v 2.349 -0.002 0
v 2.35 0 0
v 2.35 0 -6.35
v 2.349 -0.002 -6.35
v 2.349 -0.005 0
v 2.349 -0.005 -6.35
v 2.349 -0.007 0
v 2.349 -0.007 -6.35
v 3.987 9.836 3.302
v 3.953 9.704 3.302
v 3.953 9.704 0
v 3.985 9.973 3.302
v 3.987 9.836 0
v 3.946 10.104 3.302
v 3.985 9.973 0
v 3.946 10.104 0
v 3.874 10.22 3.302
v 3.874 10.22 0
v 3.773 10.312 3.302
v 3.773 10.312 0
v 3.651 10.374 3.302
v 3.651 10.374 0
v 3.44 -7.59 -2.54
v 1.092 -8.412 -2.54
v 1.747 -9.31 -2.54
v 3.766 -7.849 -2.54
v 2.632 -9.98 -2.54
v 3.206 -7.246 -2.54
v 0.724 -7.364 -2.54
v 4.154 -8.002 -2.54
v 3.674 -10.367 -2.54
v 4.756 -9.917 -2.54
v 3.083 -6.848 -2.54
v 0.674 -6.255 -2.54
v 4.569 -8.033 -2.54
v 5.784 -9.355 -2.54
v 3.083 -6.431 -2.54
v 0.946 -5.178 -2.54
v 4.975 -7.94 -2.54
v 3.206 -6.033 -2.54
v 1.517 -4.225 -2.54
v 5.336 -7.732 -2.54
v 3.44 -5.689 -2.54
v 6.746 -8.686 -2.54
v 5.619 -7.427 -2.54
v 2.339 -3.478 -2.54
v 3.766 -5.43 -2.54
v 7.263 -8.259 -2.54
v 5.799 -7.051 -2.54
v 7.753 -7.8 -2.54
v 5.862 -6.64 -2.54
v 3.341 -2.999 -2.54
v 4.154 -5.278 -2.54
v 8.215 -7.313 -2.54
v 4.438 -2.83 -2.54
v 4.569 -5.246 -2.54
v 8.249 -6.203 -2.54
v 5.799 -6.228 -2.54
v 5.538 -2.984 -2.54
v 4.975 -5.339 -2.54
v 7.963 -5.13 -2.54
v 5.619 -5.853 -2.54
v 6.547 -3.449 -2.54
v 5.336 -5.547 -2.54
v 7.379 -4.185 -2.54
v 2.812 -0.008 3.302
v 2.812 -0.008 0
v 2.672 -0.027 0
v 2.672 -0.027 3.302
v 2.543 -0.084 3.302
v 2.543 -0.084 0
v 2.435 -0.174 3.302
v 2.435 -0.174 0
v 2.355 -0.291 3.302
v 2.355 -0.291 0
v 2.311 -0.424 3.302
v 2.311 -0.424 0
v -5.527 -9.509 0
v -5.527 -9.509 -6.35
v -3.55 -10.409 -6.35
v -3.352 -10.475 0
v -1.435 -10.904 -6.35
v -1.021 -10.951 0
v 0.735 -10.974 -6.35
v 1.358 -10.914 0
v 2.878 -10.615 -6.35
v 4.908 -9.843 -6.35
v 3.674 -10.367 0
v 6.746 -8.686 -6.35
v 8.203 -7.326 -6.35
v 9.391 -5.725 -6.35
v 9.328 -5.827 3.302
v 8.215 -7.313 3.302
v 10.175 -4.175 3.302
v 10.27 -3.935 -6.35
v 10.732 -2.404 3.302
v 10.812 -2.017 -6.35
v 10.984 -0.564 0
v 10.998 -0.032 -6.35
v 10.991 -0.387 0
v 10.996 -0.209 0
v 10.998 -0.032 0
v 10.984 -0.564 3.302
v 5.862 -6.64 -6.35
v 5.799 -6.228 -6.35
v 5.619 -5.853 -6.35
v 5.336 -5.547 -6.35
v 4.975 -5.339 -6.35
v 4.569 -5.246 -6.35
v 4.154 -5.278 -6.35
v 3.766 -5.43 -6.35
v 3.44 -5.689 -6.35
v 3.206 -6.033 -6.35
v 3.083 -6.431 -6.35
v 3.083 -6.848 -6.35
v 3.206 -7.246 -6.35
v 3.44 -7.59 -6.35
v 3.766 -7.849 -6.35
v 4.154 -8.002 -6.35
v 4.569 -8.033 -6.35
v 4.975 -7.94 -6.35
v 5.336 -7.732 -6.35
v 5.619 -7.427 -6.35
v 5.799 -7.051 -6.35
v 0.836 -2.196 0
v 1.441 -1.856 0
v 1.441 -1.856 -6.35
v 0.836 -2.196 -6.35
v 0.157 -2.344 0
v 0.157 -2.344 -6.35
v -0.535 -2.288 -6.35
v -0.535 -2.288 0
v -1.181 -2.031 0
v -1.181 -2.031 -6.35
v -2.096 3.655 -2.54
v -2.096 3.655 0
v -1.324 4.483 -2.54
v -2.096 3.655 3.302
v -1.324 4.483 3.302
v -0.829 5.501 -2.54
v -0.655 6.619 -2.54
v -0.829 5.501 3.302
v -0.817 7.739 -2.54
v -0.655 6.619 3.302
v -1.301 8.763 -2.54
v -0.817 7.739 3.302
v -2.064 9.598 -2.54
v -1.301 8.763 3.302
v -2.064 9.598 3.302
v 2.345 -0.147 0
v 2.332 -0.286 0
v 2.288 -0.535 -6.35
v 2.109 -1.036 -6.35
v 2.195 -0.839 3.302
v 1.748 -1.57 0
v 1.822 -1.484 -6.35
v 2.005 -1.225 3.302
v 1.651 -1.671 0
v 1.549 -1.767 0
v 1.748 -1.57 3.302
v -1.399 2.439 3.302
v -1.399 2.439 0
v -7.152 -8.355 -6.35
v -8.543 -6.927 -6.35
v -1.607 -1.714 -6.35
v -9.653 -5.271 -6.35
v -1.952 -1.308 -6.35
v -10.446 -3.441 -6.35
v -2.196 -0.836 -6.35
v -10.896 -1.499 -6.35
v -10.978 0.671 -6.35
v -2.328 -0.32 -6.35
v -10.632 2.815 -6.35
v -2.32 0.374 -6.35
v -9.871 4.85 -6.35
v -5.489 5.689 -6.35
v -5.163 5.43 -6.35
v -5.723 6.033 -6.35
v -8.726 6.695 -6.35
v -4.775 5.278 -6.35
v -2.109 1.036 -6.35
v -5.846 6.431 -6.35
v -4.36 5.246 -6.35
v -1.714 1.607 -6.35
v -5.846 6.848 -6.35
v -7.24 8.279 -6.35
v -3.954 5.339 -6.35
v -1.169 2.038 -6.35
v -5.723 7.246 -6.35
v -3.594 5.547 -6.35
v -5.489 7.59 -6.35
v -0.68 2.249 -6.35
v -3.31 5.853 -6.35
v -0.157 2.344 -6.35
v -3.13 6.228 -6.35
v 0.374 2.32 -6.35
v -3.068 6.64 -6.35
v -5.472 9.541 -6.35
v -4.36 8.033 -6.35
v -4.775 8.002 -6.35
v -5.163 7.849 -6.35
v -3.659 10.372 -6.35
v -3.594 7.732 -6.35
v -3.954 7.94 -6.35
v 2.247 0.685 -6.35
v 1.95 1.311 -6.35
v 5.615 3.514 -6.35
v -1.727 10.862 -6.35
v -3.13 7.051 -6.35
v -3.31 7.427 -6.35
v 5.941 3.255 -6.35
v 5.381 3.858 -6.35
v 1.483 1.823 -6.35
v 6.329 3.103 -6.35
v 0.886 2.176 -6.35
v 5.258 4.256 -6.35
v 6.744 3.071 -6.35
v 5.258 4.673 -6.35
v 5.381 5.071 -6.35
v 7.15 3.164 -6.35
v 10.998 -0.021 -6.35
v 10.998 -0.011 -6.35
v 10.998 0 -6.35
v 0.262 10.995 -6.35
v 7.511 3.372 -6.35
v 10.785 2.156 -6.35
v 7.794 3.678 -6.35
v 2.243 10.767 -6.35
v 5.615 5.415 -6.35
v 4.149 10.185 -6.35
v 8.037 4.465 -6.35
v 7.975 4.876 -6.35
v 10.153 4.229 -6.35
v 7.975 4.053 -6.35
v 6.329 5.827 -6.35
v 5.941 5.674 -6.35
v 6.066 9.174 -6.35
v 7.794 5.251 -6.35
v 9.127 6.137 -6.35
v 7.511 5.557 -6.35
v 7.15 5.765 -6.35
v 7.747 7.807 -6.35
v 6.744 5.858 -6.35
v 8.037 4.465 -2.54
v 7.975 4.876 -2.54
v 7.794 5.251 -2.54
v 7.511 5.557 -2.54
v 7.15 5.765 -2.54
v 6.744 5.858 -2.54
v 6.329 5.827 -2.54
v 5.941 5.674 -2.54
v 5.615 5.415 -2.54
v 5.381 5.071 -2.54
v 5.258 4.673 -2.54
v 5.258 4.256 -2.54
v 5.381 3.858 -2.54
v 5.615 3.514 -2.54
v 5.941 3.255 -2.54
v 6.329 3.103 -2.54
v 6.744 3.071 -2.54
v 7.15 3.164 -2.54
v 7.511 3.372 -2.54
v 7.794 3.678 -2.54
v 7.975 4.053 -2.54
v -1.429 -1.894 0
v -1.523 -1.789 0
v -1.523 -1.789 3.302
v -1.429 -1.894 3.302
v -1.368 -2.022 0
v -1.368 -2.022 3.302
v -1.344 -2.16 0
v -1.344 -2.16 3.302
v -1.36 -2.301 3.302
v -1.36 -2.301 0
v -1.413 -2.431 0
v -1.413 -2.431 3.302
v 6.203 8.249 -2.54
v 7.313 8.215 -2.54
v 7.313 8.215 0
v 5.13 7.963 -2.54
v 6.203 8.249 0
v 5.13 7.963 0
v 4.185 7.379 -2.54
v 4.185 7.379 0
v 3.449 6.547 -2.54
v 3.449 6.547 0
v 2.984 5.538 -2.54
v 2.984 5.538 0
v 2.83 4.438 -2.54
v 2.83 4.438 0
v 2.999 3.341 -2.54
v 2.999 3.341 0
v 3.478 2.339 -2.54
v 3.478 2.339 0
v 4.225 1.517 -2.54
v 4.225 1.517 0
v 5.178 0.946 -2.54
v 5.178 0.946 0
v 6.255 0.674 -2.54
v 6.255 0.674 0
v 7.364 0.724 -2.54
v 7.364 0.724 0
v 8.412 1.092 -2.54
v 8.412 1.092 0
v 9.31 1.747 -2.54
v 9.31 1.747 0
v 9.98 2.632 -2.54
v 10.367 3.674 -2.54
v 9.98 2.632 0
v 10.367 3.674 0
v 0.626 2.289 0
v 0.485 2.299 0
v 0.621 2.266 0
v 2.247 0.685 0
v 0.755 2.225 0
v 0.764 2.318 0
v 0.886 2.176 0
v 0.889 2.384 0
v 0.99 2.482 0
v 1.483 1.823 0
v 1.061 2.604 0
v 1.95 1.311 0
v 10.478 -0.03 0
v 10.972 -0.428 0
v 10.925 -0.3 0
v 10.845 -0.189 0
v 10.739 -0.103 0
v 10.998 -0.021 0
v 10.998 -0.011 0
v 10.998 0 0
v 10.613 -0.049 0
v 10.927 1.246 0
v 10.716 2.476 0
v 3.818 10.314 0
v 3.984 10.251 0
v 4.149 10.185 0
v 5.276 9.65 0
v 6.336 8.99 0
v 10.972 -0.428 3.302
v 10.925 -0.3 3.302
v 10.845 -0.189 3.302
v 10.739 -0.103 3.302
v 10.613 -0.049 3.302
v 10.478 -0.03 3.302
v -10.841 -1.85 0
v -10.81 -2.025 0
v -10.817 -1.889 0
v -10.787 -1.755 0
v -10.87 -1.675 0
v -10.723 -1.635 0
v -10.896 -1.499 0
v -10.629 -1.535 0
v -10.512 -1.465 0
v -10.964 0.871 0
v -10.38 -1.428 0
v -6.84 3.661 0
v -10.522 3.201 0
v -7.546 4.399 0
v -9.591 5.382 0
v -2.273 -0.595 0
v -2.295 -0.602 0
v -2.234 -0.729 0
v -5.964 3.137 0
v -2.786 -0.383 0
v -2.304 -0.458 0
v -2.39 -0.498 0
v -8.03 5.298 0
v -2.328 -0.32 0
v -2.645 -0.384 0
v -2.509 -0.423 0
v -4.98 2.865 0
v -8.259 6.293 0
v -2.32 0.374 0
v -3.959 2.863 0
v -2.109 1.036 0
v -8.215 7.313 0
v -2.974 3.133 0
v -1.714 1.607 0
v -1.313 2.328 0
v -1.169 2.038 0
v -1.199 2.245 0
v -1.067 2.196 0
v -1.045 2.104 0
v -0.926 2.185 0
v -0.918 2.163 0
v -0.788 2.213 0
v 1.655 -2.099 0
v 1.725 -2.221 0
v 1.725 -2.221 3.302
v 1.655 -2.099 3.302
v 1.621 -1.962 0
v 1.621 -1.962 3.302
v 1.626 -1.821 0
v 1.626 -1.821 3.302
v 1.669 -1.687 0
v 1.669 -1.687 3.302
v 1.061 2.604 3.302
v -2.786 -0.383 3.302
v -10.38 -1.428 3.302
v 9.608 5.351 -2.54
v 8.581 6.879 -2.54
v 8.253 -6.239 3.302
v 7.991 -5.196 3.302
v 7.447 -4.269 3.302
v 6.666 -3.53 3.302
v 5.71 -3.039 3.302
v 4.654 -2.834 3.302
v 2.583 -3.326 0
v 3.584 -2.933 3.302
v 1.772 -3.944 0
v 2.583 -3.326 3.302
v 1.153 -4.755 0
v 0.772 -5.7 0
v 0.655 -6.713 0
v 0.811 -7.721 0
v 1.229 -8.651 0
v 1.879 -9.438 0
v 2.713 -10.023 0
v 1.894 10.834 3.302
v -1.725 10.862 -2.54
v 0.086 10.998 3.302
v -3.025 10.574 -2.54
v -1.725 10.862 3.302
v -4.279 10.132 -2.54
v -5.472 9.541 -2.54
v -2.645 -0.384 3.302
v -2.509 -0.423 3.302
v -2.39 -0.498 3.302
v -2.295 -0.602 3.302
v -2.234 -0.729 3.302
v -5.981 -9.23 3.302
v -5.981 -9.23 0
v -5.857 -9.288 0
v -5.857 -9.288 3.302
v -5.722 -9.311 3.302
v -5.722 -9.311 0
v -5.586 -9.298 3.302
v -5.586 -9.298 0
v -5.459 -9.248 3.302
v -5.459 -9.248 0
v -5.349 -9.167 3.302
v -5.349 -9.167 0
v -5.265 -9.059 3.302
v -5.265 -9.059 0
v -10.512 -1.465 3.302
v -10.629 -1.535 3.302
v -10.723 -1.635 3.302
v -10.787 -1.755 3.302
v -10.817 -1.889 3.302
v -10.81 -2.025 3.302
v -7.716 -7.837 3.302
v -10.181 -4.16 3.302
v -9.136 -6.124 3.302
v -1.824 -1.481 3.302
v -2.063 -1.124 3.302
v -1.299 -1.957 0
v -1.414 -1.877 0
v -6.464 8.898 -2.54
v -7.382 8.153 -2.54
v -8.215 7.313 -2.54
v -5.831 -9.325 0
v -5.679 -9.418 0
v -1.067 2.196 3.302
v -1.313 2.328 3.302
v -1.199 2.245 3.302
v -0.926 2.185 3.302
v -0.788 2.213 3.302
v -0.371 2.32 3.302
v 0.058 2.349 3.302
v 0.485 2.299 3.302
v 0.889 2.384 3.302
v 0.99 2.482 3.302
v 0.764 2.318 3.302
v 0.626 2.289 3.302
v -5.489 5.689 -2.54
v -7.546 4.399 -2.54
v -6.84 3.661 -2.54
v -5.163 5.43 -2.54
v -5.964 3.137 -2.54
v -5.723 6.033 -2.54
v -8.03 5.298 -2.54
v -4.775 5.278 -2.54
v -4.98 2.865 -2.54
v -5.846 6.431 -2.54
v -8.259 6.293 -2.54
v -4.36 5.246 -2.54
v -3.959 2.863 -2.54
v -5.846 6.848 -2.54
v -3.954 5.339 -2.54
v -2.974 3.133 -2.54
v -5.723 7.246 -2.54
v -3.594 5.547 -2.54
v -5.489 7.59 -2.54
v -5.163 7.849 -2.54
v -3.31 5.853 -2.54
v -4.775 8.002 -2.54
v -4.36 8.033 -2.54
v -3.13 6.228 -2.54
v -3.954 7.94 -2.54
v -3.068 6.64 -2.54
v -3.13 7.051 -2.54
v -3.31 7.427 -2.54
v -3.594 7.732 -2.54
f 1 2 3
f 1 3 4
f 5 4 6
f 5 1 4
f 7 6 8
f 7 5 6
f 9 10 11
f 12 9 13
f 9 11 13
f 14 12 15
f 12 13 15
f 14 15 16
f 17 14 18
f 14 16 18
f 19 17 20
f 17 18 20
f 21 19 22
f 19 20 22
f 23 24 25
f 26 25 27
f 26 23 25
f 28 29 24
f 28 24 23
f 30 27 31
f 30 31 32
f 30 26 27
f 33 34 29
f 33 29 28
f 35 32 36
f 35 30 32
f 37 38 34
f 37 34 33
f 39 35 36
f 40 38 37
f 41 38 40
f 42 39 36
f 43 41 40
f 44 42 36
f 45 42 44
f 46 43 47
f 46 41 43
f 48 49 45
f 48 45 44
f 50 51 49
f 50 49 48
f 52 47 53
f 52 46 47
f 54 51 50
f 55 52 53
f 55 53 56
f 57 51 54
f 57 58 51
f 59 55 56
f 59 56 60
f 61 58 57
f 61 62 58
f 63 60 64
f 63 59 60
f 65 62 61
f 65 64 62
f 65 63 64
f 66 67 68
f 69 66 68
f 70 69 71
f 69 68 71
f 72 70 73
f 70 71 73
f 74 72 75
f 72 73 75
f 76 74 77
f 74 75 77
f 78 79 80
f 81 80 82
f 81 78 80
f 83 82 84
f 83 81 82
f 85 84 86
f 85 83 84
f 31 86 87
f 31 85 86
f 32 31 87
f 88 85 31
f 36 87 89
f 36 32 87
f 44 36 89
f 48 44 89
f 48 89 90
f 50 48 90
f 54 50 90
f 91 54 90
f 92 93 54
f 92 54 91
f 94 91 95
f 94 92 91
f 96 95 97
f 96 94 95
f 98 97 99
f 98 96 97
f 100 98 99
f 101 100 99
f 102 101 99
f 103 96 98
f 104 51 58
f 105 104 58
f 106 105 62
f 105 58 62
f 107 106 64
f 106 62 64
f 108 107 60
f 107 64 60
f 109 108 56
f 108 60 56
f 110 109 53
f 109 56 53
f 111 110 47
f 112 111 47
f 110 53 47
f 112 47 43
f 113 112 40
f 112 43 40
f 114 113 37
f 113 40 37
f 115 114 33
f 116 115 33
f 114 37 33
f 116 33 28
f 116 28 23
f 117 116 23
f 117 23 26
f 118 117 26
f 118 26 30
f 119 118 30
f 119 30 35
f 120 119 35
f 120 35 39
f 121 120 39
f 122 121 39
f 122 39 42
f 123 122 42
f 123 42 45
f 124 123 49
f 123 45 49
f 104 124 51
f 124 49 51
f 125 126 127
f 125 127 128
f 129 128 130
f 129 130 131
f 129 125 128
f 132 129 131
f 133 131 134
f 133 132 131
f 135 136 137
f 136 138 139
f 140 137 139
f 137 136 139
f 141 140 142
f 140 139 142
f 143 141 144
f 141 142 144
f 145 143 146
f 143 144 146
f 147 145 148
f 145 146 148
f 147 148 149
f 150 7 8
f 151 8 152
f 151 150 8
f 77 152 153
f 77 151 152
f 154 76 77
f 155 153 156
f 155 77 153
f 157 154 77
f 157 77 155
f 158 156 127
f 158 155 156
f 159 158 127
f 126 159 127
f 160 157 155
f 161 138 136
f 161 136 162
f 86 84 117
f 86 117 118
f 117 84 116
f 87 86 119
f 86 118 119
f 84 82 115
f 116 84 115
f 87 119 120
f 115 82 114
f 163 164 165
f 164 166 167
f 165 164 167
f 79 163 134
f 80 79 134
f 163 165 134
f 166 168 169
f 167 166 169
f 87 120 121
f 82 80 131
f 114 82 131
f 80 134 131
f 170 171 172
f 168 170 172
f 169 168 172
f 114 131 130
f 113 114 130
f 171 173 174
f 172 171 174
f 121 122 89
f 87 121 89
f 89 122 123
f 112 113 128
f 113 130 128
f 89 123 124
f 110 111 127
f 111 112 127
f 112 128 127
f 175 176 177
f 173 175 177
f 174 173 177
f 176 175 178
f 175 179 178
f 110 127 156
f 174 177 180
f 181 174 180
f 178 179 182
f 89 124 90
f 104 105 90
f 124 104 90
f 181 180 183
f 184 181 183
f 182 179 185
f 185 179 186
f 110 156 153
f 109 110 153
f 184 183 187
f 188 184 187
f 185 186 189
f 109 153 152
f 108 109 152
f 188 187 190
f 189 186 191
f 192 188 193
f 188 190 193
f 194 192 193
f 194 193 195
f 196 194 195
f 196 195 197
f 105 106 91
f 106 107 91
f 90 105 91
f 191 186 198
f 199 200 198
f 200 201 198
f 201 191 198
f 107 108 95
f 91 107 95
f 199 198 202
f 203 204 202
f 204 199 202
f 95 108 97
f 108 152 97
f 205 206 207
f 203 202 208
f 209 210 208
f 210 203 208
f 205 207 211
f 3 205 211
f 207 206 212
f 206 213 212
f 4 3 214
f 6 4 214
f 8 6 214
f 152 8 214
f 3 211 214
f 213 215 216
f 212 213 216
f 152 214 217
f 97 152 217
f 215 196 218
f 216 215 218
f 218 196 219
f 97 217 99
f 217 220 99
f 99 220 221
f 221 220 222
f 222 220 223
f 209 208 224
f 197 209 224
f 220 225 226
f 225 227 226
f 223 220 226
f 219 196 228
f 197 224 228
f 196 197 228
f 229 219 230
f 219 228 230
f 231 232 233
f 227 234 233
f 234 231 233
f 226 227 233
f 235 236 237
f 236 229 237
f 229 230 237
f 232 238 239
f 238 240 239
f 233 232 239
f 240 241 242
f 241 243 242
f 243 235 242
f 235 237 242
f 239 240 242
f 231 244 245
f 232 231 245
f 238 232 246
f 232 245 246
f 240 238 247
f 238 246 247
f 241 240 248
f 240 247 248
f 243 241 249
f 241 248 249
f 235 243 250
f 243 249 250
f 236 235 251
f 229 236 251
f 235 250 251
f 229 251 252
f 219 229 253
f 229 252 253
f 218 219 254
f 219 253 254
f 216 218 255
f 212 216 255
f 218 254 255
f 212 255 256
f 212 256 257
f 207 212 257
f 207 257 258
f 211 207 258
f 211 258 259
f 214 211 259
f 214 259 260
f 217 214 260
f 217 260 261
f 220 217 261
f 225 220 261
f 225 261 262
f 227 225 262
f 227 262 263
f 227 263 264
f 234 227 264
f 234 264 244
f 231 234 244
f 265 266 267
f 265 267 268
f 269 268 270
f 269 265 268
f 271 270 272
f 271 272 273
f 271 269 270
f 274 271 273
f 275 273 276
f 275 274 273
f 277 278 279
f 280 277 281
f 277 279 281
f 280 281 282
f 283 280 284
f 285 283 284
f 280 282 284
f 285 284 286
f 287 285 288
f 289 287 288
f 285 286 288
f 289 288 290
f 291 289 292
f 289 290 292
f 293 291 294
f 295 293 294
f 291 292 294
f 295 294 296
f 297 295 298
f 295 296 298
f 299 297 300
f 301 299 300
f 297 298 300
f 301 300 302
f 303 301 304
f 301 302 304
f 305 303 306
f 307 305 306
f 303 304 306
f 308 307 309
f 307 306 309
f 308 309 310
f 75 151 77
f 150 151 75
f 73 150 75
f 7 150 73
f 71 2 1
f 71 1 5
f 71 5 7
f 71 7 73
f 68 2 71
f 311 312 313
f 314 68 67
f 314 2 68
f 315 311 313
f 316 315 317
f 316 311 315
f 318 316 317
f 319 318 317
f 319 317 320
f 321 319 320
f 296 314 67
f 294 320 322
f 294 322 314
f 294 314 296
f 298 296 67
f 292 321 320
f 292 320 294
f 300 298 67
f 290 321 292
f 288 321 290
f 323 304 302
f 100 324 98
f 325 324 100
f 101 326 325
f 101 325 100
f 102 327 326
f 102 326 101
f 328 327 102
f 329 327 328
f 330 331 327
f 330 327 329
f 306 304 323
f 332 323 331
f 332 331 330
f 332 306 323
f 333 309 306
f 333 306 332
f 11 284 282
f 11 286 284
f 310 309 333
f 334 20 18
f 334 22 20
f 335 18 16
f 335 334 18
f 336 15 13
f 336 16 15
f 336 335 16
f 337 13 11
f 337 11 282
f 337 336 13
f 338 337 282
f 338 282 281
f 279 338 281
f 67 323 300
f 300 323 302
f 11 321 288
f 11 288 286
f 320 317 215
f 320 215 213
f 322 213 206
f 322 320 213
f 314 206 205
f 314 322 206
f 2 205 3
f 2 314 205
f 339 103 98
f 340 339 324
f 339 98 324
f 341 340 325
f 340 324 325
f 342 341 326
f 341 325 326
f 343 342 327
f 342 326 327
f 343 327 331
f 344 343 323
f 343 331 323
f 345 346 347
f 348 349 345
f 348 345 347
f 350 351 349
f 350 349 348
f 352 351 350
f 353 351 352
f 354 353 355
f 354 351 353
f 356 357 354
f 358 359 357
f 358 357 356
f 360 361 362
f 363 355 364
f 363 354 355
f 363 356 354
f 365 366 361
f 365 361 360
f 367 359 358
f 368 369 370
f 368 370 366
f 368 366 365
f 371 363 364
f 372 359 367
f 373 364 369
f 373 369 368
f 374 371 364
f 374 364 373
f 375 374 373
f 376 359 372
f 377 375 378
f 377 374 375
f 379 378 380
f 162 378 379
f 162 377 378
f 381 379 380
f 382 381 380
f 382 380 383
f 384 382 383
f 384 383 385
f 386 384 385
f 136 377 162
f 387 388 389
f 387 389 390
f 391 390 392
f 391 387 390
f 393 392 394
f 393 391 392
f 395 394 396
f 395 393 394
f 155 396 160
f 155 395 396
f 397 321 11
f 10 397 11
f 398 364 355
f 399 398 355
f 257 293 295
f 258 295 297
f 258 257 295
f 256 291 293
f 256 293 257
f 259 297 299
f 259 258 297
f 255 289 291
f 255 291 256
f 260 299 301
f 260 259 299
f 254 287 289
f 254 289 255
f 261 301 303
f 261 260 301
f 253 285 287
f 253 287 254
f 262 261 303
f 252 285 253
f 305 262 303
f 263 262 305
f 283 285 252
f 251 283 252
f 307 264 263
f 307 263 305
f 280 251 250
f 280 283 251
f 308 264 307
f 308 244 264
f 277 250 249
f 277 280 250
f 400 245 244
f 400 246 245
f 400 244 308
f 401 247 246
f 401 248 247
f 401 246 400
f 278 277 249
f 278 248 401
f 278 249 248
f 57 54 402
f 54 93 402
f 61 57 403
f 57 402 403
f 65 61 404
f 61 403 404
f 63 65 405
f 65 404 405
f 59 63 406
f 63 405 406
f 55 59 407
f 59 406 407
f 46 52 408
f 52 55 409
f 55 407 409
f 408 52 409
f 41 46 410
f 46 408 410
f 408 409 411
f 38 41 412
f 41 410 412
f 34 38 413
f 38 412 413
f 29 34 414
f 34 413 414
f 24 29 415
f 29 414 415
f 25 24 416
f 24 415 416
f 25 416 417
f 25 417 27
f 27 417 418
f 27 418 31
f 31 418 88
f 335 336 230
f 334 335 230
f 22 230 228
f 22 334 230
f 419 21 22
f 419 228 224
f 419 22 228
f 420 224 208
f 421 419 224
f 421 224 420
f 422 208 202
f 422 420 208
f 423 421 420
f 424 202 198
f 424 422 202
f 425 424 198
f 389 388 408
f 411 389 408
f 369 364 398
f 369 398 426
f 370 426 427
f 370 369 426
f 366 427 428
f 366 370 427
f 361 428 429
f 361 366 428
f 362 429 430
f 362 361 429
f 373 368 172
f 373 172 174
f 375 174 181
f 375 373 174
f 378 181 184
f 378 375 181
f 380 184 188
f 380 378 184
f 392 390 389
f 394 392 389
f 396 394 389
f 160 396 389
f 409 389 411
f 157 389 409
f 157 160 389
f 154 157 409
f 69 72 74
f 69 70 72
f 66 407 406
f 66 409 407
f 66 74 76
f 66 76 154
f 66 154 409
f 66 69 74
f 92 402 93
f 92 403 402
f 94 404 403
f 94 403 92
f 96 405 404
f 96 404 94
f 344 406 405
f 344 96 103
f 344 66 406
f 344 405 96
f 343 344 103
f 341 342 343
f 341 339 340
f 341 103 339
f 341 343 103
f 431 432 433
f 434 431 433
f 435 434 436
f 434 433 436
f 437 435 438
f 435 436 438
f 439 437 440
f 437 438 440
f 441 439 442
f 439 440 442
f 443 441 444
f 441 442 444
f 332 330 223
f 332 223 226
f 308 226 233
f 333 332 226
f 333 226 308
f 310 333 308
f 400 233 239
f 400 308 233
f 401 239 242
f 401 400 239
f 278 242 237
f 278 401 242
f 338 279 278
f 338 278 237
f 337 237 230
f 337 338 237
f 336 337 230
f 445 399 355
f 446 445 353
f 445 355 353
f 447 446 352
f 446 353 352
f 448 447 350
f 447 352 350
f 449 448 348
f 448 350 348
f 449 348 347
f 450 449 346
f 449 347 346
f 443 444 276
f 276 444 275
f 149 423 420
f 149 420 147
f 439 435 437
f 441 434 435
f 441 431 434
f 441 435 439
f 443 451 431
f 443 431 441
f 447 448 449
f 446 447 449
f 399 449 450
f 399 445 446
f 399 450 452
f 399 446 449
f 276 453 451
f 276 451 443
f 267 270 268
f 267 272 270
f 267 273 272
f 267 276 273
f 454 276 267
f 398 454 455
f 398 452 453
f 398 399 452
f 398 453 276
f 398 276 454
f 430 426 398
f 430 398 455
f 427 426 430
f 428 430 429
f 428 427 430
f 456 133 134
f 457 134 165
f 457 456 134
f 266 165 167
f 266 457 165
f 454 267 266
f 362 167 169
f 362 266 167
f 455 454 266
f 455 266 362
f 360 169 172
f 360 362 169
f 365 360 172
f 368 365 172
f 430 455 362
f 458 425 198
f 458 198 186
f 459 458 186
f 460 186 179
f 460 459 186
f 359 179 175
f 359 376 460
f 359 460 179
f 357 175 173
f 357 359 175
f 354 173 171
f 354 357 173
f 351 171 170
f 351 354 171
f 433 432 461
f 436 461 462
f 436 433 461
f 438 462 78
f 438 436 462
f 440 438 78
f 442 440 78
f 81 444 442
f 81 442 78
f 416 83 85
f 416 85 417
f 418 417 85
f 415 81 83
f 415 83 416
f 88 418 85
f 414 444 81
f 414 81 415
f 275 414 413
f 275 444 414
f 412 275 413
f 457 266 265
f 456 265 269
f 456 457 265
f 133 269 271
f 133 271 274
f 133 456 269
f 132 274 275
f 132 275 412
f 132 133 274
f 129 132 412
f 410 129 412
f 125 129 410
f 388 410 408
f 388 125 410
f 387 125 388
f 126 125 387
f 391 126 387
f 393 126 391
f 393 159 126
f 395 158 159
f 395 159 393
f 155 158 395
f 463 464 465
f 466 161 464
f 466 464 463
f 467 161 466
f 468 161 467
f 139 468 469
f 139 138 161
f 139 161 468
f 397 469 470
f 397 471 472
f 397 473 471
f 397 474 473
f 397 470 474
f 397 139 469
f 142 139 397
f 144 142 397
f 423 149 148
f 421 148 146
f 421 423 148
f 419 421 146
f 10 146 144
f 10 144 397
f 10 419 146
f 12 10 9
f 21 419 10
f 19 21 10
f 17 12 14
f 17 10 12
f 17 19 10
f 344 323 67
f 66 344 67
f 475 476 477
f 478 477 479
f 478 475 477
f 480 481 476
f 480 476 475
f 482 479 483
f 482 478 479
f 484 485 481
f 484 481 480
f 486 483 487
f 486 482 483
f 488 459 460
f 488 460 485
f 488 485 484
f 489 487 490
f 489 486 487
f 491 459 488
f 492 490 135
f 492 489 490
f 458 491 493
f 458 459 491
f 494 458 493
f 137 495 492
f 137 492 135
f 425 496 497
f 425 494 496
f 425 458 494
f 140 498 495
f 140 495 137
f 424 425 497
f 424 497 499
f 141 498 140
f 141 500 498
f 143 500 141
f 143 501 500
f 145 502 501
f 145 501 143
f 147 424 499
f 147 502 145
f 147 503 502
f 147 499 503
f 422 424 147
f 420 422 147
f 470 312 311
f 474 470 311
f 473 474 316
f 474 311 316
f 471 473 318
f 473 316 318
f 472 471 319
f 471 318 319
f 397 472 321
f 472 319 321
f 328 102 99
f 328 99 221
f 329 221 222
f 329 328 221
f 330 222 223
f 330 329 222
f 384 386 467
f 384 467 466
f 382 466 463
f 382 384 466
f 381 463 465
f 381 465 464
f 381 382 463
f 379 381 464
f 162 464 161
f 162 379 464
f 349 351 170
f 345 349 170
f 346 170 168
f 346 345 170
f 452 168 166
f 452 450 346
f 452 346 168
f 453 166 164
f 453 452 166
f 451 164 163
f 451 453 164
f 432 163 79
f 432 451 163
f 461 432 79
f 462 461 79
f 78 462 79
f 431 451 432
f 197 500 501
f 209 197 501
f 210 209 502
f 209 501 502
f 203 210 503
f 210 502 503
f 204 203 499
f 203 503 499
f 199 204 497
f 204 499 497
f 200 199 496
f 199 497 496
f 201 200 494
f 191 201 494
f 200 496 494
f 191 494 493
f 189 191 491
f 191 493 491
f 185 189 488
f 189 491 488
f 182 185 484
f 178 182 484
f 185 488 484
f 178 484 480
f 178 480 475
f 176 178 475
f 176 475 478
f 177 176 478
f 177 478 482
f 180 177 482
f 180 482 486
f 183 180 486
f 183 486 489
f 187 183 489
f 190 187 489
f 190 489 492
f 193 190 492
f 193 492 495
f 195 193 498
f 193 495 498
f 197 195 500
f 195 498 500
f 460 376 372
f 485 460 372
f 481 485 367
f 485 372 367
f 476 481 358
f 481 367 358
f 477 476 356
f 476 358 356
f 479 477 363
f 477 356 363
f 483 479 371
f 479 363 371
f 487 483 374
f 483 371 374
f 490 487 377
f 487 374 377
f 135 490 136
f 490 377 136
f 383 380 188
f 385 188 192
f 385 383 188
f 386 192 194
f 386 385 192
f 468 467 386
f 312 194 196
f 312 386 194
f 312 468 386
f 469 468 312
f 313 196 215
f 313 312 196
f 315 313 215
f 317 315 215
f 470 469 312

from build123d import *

# Parameters (mm, degrees)
F1_DEPTH      = 3.302
F2_DEPTH      = 6.35
F3_T1_DEPTH   = 4.6338919233
F4_T1_DEPTH   = 4.4582047696
F5_R          = 1.397
F6_DEPTH      = 6.351
F6_DEPTH_BACK = 25.4
F7_R          = 3.81
F8_DEPTH      = 5.842
F9_T1_DEPTH   = 8.456355204
F9_T3_DEPTH   = 2.54


# Not quite as in the source:
# - a fillet or chamfer that OpenCascade refuses, or shapes differently, is made with other operations: its cross-section is extruded or revolved along the edge and cut away or added


with BuildPart() as f1:
    # F0 (on Top) → F1 (new body)
    with BuildSketch(Plane.XY):
        with BuildLine():
            Line((0.8864303251, 2.1758656964), (4.1494522244, 10.1854037464))
            ThreePointArc((4.1494522244, 10.1854037464), (-0.7354841661, 10.9735803766), (-5.4715498037, 9.5405736717))
            Line((-5.4715498037, 9.5405736717), (-1.1688645655, 2.0381133132))
            ThreePointArc((-1.1688645655, 2.0381133132), (-0.157118442, 2.3442406116), (0.8864303251, 2.1758656964))
        make_face()
    extrude(amount=F1_DEPTH)



with BuildPart() as f1b:
    # F0 (on Top) → F1, piece 2 (new body)
    with BuildSketch(Plane.XY):
        with BuildLine():
            Line((-2.3275701308, -0.320261668), (-10.8955445044, -1.4991708351))
            ThreePointArc((-10.8955445044, -1.4991708351), (-9.1356572935, -6.1237381602), (-5.5266042645, -9.5087879639))
            Line((-5.5266042645, -9.5087879639), (-1.1806256223, -2.0313230639))
            ThreePointArc((-1.1806256223, -2.0313230639), (-1.9516127013, -1.3081888679), (-2.3275701308, -0.320261668))
        make_face()
    extrude(amount=F1_DEPTH)


with BuildPart() as f1c:
    # F0 (on Top) → F1, piece 3 (new body)
    with BuildSketch(Plane.XY):
        with BuildLine():
            ThreePointArc((6.74609228, -8.6862329113), (9.8711414597, -4.8498422164), (10.9981540682, -0.0317857078))
            Line((10.9981540682, -0.0317857078), (2.3494901878, -0.0067902494))
            ThreePointArc((2.3494901878, -0.0067902494), (2.1087311432, -1.0360517437), (1.4411398058, -1.8556040284))
            Line((1.4411398058, -1.8556040284), (6.74609228, -8.6862329113))
        make_face()
    extrude(amount=F1_DEPTH)


with BuildPart() as f1_1:
    add(f1.part)

    add(f1b.part)  # F2 merges F1b

    add(f1c.part)  # F2 merges F1c
    # F0 (on Top) → F2 (join)
    with BuildSketch(Plane.XY):
        with BuildLine():
            ThreePointArc((10.9981540682, -0.0317857078), (10.9981885171, -0.0158928705), (10.9982, 0))
            ThreePointArc((10.9982, 0), (9.1267986911, 6.136933183), (4.1494522244, 10.1854037464))
            Line((4.1494522244, 10.1854037464), (0.8864303251, 2.1758656964))
            ThreePointArc((0.8864303251, 2.1758656964), (1.9497202747, 1.3110076661), (2.3495, 0))
            ThreePointArc((2.3495, 0), (2.3494975469, -0.0033951282), (2.3494901878, -0.0067902494))
            Line((2.3494901878, -0.0067902494), (10.9981540682, -0.0317857078))
        make_face()
        with BuildLine():
            Line((0.8864303251, 2.1758656964), (4.1494522244, 10.1854037464))
            ThreePointArc((4.1494522244, 10.1854037464), (-0.7354841661, 10.9735803766), (-5.4715498037, 9.5405736717))
            Line((-5.4715498037, 9.5405736717), (-1.1688645655, 2.0381133132))
            ThreePointArc((-1.1688645655, 2.0381133132), (-0.157118442, 2.3442406116), (0.8864303251, 2.1758656964))
        make_face()
        with BuildLine():
            ThreePointArc((6.74609228, -8.6862329113), (9.8711414597, -4.8498422164), (10.9981540682, -0.0317857078))
            Line((10.9981540682, -0.0317857078), (2.3494901878, -0.0067902494))
            ThreePointArc((2.3494901878, -0.0067902494), (2.1087311432, -1.0360517437), (1.4411398058, -1.8556040284))
            Line((1.4411398058, -1.8556040284), (6.74609228, -8.6862329113))
        make_face()
        with BuildLine():
            Line((-1.1688645655, 2.0381133132), (-5.4715498037, 9.5405736717))
            ThreePointArc((-5.4715498037, 9.5405736717), (-9.8711414597, 4.8498422164), (-10.8955445044, -1.4991708351))
            Line((-10.8955445044, -1.4991708351), (-2.3275701308, -0.320261668))
            ThreePointArc((-2.3275701308, -0.320261668), (-2.1087311432, 1.0360517437), (-1.1688645655, 2.0381133132))
        make_face()
        with BuildLine():
            ThreePointArc((-5.5266042645, -9.5087879639), (0.7354841661, -10.9735803766), (6.74609228, -8.6862329113))
            Line((6.74609228, -8.6862329113), (1.4411398058, -1.8556040284))
            ThreePointArc((1.4411398058, -1.8556040284), (0.157118442, -2.3442406116), (-1.1806256223, -2.0313230639))
            Line((-1.1806256223, -2.0313230639), (-5.5266042645, -9.5087879639))
        make_face()
        with BuildLine():
            Line((-2.3275701308, -0.320261668), (-10.8955445044, -1.4991708351))
            ThreePointArc((-10.8955445044, -1.4991708351), (-9.1356572935, -6.1237381602), (-5.5266042645, -9.5087879639))
            Line((-5.5266042645, -9.5087879639), (-1.1806256223, -2.0313230639))
            ThreePointArc((-1.1806256223, -2.0313230639), (-1.9516127013, -1.3081888679), (-2.3275701308, -0.320261668))
        make_face()
    extrude(amount=-F2_DEPTH)

    # F3: fillet of radius 0.508 on 6 edges, made by hand

    # F3_s2 → F3_t1 (cut)
    with BuildSketch(Plane.XY):
        with BuildLine():
            ThreePointArc((3.9531481969, 9.7035483908), (3.9459668292, 10.1036299064), (3.6513440541, 10.3743958782))
            ThreePointArc((3.6513440541, 10.3743958782), (3.901542663, 10.2829163222), (4.1494522244, 10.1854037464))
            Line((4.1494522244, 10.1854037464), (3.9531481969, 9.7035483908))
        make_face()
        with BuildLine():
            ThreePointArc((10.9837113978, -0.5643466757), (10.8451967866, -0.1889395718), (10.4778487793, -0.0302819762))
            Line((10.4778487793, -0.0302819762), (10.9981540682, -0.0317857078))
            ThreePointArc((10.9981540682, -0.0317857078), (10.9941578867, -0.2981536556), (10.9837113978, -0.5643466757))
        make_face()
        with BuildLine():
            ThreePointArc((-5.212699429, 9.089224208), (-5.2589719244, 9.4866857122), (-5.0031171412, 9.7943464361))
            ThreePointArc((-5.0031171412, 9.7943464361), (-5.2388703034, 9.6702968509), (-5.4715498037, 9.5405736717))
            Line((-5.4715498037, 9.5405736717), (-5.212699429, 9.089224208))
        make_face()
        with BuildLine():
            ThreePointArc((7.1588183524, -8.3493546479), (6.7770167548, -8.4691224698), (6.4269453148, -8.2753009589))
            Line((6.4269453148, -8.2753009589), (6.74609228, -8.6862329113))
            ThreePointArc((6.74609228, -8.6862329113), (6.9544954285, -8.5202932212), (7.1588183524, -8.3493546479))
        make_face()
        with BuildLine():
            ThreePointArc((-5.9805942565, -9.2299997605), (-5.5862248623, -9.2977461404), (-5.2651493503, -9.0589422318))
            Line((-5.2651493503, -9.0589422318), (-5.5266042645, -9.5087879639))
            ThreePointArc((-5.5266042645, -9.5087879639), (-5.7552875833, -9.3721431953), (-5.9805942565, -9.2299997605))
        make_face()
        with BuildLine():
            ThreePointArc((-10.3800935118, -1.428247432), (-10.722983584, -1.6345074366), (-10.8101624065, -2.0250412303))
            ThreePointArc((-10.8101624065, -2.0250412303), (-10.8560380915, -1.762623101), (-10.8955445044, -1.4991708351))
            Line((-10.8955445044, -1.4991708351), (-10.3800935118, -1.428247432))
        make_face()
    extrude(amount=F3_T1_DEPTH, mode=Mode.SUBTRACT)

    # F4: fillet of radius 0.508 on 6 edges, made by hand

    # F4_s2 → F4_t1 (cut)
    with BuildSketch(Plane.XY):
        with BuildLine():
            ThreePointArc((-2.7857353042, -0.3833028373), (-2.4469491553, -0.4559663275), (-2.2335580647, -0.7289503561))
            ThreePointArc((-2.2335580647, -0.7289503561), (-2.2897006824, -0.5267077321), (-2.3275701308, -0.320261668))
            Line((-2.3275701308, -0.320261668), (-2.7857353042, -0.3833028373))
        make_face()
        with BuildLine():
            ThreePointArc((-1.5229431343, -1.7890764264), (-1.3515120564, -2.0901867434), (-1.4130231496, -2.4311741667))
            Line((-1.4130231496, -2.4311741667), (-1.1806256223, -2.0313230639))
            ThreePointArc((-1.1806256223, -2.0313230639), (-1.3572000088, -1.9178525455), (-1.5229431343, -1.7890764264))
        make_face()
        with BuildLine():
            ThreePointArc((-0.7879140674, 2.2134456561), (-1.1343987902, 2.215537146), (-1.3989470146, 2.439301027))
            Line((-1.3989470146, 2.439301027), (-1.1688645655, 2.0381133132))
            ThreePointArc((-1.1688645655, 2.0381133132), (-0.9823090207, 2.1342959584), (-0.7879140674, 2.2134456561))
        make_face()
        with BuildLine():
            ThreePointArc((0.4854895058, 2.2987932029), (0.8285961548, 2.3471032941), (1.0609176577, 2.6041689603))
            Line((1.0609176577, 2.6041689603), (0.8864303251, 2.1758656964))
            ThreePointArc((0.8864303251, 2.1758656964), (0.6887080648, 2.2462928241), (0.4854895058, 2.2987932029))
        make_face()
        with BuildLine():
            ThreePointArc((1.7248176465, -2.220866123), (1.6183530006, -1.8911369665), (1.7480685589, -1.5698428468))
            ThreePointArc((1.7480685589, -1.5698428468), (1.6009926176, -1.719585092), (1.4411398058, -1.8556040284))
            Line((1.4411398058, -1.8556040284), (1.7248176465, -2.220866123))
        make_face()
        with BuildLine():
            ThreePointArc((2.8119701642, -0.0081268603), (2.4859108466, -0.1253504027), (2.3108572018, -0.4243692296))
            ThreePointArc((2.3108572018, -0.4243692296), (2.3395090295, -0.2164434129), (2.3494901878, -0.0067902494))
            Line((2.3494901878, -0.0067902494), (2.8119701642, -0.0081268603))
        make_face()
    extrude(amount=F4_T1_DEPTH, mode=Mode.SUBTRACT)

    # F5 (on face) → F6 (cut, two sides)
    with BuildSketch(Plane.XY) as f6_sk:
        with Locations((-4.4645385024, 6.6395705404)):
            Circle(F5_R)
        with Locations((6.6395705404, 4.4645385024)):
            Circle(F5_R)
        with Locations((4.4645385024, -6.6395705404)):
            Circle(F5_R)
    extrude(amount=-F6_DEPTH, mode=Mode.SUBTRACT)
    extrude(f6_sk.sketch, amount=F6_DEPTH_BACK, mode=Mode.SUBTRACT)

    # F7 (on face) → F8 (cut)
    with BuildSketch(Plane.XY.offset(3.302)):
        with Locations((4.4645385024, -6.6395705404)):
            Circle(F7_R)
        with Locations((6.6395705404, 4.4645385024)):
            Circle(F7_R)
        with BuildLine():
            ThreePointArc((-2.0962074568, 3.6550926868), (-1.0338358569, 4.9823501693), (-0.6545385024, 6.6395705404))
            ThreePointArc((-0.6545385024, 6.6395705404), (-1.5039813545, 9.0377367927), (-3.6735418484, 10.3665564933))
            ThreePointArc((-3.6735418484, 10.3665564933), (-4.3477533155, 10.102348457), (-5.0031171412, 9.7943464361))
            ThreePointArc((-5.0031171412, 9.7943464361), (-5.2589719244, 9.4866857122), (-5.212699429, 9.089224208))
            Line((-5.212699429, 9.089224208), (-4.6049424864, 8.0294970569))
            ThreePointArc((-4.6049424864, 8.0294970569), (-3.5276648091, 7.6758507548), (-3.0675385024, 6.6395705404))
            ThreePointArc((-3.0675385024, 6.6395705404), (-3.1362873981, 6.2067218326), (-3.3357675701, 5.8164756598))
            Line((-3.3357675701, 5.8164756598), (-2.0962074568, 3.6550926868))
        make_face()
        with BuildLine():
            ThreePointArc((-5.0031171412, 9.7943464361), (-4.3477533155, 10.102348457), (-3.6735418484, 10.3665564933))
            ThreePointArc((-3.6735418484, 10.3665564933), (-8.1734837008, 5.7678908314), (-2.0962074568, 3.6550926868))
            Line((-2.0962074568, 3.6550926868), (-3.3357675701, 5.8164756598))
            ThreePointArc((-3.3357675701, 5.8164756598), (-3.1362873981, 6.2067218326), (-3.0675385024, 6.6395705404))
            ThreePointArc((-3.0675385024, 6.6395705404), (-3.5276648091, 7.6758507548), (-4.6049424864, 8.0294970569))
            Line((-4.6049424864, 8.0294970569), (-5.212699429, 9.089224208))
            ThreePointArc((-5.212699429, 9.089224208), (-5.2589719244, 9.4866857122), (-5.0031171412, 9.7943464361))
        make_face()
    extrude(amount=-F8_DEPTH, mode=Mode.SUBTRACT)

    # F9: chamfer of 2.54 on 2 edges, made by hand

    # F9_s2 → F9_t1 (cut)
    with BuildSketch(Plane.XY):
        with BuildLine():
            Line((-1.6990973778, 10.9601467928), (-2.0905864719, 9.5002911113))
            Line((-2.0905864719, 9.5002911113), (-2.1225900483, 9.460839735))
            ThreePointArc((-2.1225900483, 9.460839735), (-2.8366247449, 10.0280040188), (-3.6840884704, 10.3168633472))
            Line((-3.6840884704, 10.3168633472), (-3.6905097091, 10.4144389713))
            ThreePointArc((-3.6905097091, 10.4144389713), (-2.6991406456, 10.7142447599), (-1.7070669555, 11.0103177588))
            Line((-1.7070669555, 11.0103177588), (-1.6990973778, 10.9601467928))
        make_face()
    extrude(amount=F9_T1_DEPTH, mode=Mode.SUBTRACT)

    # F9_s4 → F9_t3 (cut)
    with BuildSketch(Plane.XY.offset(-2.54)):
        with BuildLine():
            Line((-2.0905864719, 9.5002911113), (-1.6990973778, 10.9601467928))
            Line((-1.6990973778, 10.9601467928), (-1.7070669555, 11.0103177588))
            ThreePointArc((-1.7070669555, 11.0103177588), (-2.6991406456, 10.7142447599), (-3.6905097091, 10.4144389713))
            Line((-3.6905097091, 10.4144389713), (-3.6840884704, 10.3168633472))
            ThreePointArc((-3.6840884704, 10.3168633472), (-2.8366247449, 10.0280040188), (-2.1225900483, 9.460839735))
            Line((-2.1225900483, 9.460839735), (-2.0905864719, 9.5002911113))
        make_face()
    extrude(amount=F9_T3_DEPTH, mode=Mode.SUBTRACT)


solid = f1_1.part
